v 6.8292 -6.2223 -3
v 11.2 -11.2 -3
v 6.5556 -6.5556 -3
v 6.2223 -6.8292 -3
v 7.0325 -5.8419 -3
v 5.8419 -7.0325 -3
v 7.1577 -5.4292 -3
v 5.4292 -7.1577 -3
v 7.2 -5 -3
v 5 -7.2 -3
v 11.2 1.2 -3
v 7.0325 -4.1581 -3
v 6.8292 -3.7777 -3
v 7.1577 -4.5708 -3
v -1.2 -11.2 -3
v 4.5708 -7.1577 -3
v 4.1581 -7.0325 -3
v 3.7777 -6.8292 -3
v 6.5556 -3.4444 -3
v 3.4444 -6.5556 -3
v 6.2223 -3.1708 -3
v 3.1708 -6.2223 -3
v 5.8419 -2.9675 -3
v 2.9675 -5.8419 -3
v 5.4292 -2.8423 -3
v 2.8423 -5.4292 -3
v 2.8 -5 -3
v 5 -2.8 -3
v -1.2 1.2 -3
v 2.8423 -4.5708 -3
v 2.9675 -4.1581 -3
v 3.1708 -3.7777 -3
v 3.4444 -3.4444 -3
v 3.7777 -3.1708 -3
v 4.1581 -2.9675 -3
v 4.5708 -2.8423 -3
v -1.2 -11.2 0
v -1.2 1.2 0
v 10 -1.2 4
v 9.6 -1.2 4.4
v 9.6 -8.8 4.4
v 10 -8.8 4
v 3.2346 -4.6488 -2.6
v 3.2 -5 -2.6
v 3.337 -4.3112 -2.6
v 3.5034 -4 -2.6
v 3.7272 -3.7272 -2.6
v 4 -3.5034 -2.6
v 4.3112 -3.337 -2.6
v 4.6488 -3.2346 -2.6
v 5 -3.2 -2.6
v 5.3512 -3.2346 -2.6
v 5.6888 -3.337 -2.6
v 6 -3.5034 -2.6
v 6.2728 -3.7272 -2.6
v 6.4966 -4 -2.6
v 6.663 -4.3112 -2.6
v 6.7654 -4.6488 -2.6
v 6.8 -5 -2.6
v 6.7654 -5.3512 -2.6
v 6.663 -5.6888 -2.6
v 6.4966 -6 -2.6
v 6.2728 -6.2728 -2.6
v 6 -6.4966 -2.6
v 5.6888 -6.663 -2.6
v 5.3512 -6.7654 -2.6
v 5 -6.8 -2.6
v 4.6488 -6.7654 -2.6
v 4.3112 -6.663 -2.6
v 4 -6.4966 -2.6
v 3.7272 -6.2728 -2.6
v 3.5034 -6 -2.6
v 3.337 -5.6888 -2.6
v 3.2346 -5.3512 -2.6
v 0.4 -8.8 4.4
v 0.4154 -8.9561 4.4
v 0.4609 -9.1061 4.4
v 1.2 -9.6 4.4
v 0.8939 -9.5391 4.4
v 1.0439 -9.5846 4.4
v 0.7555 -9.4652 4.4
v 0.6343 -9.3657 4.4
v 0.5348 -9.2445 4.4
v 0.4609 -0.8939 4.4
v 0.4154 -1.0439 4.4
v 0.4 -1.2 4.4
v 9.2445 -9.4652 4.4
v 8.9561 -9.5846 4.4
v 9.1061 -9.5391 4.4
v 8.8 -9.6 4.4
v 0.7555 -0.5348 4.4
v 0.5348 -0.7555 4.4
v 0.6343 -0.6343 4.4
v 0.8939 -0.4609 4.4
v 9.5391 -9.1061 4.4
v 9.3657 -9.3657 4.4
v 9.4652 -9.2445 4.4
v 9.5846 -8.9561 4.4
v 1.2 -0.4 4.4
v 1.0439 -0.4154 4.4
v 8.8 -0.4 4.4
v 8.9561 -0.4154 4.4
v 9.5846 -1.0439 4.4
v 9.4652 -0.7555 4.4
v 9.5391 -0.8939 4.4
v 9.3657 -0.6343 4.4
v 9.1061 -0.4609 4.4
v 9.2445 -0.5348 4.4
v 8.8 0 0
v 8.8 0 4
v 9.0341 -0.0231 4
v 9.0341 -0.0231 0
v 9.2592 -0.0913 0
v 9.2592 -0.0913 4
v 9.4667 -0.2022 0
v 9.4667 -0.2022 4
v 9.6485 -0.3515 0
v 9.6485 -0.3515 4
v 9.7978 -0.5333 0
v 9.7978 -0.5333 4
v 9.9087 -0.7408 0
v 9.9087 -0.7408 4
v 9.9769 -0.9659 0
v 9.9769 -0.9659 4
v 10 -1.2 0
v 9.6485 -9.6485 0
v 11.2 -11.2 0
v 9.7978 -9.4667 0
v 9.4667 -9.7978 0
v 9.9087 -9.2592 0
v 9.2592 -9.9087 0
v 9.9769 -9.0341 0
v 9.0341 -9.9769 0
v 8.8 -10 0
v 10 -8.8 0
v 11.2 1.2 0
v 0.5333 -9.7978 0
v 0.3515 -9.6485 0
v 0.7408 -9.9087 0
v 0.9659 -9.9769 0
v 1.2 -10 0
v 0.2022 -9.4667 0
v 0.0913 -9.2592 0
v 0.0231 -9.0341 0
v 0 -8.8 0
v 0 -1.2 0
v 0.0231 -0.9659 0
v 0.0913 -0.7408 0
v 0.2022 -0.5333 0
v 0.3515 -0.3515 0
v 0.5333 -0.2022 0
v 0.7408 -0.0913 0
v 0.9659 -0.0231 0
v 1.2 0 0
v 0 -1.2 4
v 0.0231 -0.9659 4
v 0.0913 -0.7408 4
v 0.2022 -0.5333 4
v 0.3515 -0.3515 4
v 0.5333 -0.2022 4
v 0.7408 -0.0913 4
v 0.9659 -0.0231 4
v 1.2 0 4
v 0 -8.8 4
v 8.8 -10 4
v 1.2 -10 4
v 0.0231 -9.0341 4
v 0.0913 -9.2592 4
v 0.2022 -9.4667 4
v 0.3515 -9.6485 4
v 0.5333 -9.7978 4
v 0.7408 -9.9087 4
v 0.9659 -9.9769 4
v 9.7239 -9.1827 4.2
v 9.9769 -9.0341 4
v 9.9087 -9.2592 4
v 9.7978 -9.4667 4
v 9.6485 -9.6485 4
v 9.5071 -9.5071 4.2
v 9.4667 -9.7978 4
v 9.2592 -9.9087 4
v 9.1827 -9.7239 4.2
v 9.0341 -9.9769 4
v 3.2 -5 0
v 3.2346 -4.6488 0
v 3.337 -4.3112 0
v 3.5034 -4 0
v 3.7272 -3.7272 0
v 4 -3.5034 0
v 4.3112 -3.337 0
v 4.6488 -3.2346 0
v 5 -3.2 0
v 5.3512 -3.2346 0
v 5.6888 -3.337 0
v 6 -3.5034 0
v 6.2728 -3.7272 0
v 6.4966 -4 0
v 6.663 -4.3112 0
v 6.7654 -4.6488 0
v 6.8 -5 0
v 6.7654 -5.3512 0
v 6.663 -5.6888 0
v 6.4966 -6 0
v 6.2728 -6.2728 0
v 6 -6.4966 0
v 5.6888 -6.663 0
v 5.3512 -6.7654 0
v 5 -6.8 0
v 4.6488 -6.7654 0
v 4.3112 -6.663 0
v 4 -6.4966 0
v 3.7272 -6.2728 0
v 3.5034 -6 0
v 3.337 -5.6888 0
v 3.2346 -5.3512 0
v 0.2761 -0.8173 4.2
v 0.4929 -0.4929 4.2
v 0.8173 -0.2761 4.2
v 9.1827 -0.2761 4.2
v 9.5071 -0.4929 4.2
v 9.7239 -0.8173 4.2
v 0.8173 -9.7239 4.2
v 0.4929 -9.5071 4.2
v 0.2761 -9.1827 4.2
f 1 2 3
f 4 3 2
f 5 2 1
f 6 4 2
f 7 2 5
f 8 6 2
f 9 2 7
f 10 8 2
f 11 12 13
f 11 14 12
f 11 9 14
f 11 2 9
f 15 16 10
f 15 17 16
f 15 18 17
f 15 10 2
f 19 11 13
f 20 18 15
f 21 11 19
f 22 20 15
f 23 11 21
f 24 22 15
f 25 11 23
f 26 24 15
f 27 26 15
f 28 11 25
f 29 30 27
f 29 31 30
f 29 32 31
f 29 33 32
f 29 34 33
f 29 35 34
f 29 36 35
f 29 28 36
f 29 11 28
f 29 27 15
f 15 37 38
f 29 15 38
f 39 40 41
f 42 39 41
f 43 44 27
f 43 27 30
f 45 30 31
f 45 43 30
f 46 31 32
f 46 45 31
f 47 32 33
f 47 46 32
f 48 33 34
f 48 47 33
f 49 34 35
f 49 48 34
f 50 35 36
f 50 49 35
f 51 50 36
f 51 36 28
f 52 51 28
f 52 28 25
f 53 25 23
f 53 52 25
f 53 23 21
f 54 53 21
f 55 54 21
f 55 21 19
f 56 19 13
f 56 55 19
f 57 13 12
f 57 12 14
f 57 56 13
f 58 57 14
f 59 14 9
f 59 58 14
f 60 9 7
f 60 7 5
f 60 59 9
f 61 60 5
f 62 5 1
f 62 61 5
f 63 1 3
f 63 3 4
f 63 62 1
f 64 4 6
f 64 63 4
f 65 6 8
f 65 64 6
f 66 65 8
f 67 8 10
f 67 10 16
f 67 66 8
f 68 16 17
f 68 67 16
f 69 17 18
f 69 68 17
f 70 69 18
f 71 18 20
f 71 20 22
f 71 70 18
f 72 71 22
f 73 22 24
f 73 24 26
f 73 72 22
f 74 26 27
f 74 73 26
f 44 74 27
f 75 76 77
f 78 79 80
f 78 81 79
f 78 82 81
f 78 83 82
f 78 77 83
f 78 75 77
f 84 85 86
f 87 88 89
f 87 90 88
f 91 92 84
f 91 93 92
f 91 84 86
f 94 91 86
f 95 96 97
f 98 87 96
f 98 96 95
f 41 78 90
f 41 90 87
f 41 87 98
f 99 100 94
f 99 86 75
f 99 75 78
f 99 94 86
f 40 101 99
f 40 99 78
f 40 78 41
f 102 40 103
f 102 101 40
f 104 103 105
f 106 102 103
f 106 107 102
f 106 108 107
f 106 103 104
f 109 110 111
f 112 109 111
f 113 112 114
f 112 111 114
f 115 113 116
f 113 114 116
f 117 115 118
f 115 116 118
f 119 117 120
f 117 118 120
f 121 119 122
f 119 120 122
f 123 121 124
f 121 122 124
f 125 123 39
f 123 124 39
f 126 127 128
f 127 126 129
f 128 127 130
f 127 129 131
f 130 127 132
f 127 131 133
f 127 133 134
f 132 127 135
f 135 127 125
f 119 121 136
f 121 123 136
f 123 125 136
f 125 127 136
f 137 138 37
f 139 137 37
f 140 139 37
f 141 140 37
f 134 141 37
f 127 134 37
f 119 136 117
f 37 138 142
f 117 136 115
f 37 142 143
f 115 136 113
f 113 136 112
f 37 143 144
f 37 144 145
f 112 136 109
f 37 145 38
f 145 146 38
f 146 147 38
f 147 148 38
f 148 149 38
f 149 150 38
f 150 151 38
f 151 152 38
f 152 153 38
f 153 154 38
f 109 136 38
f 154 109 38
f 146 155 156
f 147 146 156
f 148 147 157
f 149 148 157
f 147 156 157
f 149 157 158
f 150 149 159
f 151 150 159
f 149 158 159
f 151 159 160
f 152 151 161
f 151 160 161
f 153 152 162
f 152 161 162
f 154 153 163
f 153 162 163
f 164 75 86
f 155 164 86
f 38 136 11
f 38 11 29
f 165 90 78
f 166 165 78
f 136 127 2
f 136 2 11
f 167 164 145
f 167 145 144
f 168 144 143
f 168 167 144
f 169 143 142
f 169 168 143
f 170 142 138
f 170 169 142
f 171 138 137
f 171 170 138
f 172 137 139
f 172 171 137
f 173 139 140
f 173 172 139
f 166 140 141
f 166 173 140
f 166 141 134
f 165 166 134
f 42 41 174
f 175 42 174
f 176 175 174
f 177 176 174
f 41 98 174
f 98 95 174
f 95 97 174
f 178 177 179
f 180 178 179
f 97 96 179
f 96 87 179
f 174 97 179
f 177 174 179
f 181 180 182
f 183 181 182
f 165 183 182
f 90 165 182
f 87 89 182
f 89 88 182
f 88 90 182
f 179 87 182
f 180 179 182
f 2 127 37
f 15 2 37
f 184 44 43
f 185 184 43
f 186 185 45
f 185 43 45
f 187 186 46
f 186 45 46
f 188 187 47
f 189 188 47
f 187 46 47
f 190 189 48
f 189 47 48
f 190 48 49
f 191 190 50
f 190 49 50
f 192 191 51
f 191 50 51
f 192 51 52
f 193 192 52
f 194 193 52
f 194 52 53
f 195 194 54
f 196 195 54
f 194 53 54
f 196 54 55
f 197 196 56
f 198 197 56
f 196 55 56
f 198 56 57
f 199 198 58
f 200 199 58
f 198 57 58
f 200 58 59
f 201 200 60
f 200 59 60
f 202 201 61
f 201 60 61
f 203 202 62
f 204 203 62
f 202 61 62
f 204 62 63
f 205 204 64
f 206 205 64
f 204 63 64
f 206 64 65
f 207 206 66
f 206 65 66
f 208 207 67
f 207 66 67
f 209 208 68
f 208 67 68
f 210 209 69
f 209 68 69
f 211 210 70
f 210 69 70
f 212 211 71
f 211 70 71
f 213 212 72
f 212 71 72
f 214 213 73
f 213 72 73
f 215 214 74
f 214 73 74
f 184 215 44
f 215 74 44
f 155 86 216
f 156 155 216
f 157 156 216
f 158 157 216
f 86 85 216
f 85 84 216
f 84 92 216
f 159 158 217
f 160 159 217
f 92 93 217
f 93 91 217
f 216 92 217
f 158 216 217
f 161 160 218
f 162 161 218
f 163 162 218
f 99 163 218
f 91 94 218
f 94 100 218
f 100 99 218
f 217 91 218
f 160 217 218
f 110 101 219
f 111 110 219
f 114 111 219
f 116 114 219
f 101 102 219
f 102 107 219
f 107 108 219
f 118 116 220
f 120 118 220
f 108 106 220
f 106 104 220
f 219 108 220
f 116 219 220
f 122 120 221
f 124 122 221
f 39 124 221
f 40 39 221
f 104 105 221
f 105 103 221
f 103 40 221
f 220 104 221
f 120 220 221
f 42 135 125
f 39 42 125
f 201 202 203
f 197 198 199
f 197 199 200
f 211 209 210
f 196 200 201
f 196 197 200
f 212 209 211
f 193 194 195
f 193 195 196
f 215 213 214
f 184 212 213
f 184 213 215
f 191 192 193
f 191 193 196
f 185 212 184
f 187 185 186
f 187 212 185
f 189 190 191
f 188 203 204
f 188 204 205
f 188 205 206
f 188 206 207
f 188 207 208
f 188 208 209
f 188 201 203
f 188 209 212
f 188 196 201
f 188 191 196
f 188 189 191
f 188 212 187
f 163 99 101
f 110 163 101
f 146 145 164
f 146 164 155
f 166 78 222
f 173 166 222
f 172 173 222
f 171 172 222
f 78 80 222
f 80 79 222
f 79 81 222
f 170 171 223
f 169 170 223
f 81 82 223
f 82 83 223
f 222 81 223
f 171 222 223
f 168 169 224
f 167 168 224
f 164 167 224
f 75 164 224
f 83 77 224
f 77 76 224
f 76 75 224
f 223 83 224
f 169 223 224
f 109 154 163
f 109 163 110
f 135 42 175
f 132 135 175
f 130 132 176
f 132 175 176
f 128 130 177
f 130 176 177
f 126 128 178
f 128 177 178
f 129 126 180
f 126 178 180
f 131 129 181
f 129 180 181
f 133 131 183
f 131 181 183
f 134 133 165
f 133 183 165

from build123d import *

# Parameters (mm, degrees)
SKETCH_1_W          = 10
SKETCH_1_H          = 10
EXTRUDE_1_DEPTH     = 4.4
SKETCH_2_W          = 12.4
SKETCH_2_H          = 12.4
EXTRUDE_2_DEPTH     = 3
SKETCH_3_R          = 1.8
CUT_EXTRUDE_1_DEPTH = 3
FILLET_1_R          = 1.2
CHAMFER_1_SIZE      = 0.4
CHAMFER_2_SIZE      = 0.4


with BuildPart() as part:
    # Эскиз1 → Бобышка-Вытянуть1 (new body)
    with BuildSketch(Plane.XY):
        with Locations((5, -5)):
            Rectangle(SKETCH_1_W, SKETCH_1_H)
    extrude(amount=EXTRUDE_1_DEPTH)

    # Эскиз2 → Бобышка-Вытянуть2 (add)
    with BuildSketch(Plane(origin=(0, 0, 0), x_dir=(-1, 0, 0), z_dir=(0, 0, -1))):
        with Locations((-5, -5)):
            Rectangle(SKETCH_2_W, SKETCH_2_H)
    extrude(amount=EXTRUDE_2_DEPTH)

    # Эскиз3 → Вырез-Вытянуть1 (cut)
    with BuildSketch(Plane(origin=(0, 0, -3), x_dir=(-1, 0, 0), z_dir=(0, 0, -1))):
        with Locations((-5, -5)):
            Circle(SKETCH_3_R)
    extrude(amount=-CUT_EXTRUDE_1_DEPTH, mode=Mode.SUBTRACT)

    # Скругление1
    fillet_1_edges = [part.edges().sort_by_distance(p)[0] for p in [
        (0, 0, 2.2),
        (10, 0, 2.2),
        (10, -10, 2.2),
        (0, -10, 2.2),
    ]]
    fillet(fillet_1_edges, radius=FILLET_1_R)

    # Фаска1
    chamfer_1_edges = [part.edges().sort_by_distance(p)[0] for p in [
        (5, 0, 4.4),
        (10, -5, 4.4),
        (0, -5, 4.4),
        (5, -10, 4.4),
        (9.648528137, -9.648528137, 4.4),
        (0.351471863, -9.648528137, 4.4),
        (0.351471863, -0.351471863, 4.4),
        (9.648528137, -0.351471863, 4.4),
    ]]
    chamfer(chamfer_1_edges, length=CHAMFER_1_SIZE)

    # Фаска2
    chamfer_2_edges = [part.edges().sort_by_distance(p)[0] for p in [
        (6.8, -5, -3),
    ]]
    chamfer(chamfer_2_edges, length=CHAMFER_2_SIZE)


solid = part.part
